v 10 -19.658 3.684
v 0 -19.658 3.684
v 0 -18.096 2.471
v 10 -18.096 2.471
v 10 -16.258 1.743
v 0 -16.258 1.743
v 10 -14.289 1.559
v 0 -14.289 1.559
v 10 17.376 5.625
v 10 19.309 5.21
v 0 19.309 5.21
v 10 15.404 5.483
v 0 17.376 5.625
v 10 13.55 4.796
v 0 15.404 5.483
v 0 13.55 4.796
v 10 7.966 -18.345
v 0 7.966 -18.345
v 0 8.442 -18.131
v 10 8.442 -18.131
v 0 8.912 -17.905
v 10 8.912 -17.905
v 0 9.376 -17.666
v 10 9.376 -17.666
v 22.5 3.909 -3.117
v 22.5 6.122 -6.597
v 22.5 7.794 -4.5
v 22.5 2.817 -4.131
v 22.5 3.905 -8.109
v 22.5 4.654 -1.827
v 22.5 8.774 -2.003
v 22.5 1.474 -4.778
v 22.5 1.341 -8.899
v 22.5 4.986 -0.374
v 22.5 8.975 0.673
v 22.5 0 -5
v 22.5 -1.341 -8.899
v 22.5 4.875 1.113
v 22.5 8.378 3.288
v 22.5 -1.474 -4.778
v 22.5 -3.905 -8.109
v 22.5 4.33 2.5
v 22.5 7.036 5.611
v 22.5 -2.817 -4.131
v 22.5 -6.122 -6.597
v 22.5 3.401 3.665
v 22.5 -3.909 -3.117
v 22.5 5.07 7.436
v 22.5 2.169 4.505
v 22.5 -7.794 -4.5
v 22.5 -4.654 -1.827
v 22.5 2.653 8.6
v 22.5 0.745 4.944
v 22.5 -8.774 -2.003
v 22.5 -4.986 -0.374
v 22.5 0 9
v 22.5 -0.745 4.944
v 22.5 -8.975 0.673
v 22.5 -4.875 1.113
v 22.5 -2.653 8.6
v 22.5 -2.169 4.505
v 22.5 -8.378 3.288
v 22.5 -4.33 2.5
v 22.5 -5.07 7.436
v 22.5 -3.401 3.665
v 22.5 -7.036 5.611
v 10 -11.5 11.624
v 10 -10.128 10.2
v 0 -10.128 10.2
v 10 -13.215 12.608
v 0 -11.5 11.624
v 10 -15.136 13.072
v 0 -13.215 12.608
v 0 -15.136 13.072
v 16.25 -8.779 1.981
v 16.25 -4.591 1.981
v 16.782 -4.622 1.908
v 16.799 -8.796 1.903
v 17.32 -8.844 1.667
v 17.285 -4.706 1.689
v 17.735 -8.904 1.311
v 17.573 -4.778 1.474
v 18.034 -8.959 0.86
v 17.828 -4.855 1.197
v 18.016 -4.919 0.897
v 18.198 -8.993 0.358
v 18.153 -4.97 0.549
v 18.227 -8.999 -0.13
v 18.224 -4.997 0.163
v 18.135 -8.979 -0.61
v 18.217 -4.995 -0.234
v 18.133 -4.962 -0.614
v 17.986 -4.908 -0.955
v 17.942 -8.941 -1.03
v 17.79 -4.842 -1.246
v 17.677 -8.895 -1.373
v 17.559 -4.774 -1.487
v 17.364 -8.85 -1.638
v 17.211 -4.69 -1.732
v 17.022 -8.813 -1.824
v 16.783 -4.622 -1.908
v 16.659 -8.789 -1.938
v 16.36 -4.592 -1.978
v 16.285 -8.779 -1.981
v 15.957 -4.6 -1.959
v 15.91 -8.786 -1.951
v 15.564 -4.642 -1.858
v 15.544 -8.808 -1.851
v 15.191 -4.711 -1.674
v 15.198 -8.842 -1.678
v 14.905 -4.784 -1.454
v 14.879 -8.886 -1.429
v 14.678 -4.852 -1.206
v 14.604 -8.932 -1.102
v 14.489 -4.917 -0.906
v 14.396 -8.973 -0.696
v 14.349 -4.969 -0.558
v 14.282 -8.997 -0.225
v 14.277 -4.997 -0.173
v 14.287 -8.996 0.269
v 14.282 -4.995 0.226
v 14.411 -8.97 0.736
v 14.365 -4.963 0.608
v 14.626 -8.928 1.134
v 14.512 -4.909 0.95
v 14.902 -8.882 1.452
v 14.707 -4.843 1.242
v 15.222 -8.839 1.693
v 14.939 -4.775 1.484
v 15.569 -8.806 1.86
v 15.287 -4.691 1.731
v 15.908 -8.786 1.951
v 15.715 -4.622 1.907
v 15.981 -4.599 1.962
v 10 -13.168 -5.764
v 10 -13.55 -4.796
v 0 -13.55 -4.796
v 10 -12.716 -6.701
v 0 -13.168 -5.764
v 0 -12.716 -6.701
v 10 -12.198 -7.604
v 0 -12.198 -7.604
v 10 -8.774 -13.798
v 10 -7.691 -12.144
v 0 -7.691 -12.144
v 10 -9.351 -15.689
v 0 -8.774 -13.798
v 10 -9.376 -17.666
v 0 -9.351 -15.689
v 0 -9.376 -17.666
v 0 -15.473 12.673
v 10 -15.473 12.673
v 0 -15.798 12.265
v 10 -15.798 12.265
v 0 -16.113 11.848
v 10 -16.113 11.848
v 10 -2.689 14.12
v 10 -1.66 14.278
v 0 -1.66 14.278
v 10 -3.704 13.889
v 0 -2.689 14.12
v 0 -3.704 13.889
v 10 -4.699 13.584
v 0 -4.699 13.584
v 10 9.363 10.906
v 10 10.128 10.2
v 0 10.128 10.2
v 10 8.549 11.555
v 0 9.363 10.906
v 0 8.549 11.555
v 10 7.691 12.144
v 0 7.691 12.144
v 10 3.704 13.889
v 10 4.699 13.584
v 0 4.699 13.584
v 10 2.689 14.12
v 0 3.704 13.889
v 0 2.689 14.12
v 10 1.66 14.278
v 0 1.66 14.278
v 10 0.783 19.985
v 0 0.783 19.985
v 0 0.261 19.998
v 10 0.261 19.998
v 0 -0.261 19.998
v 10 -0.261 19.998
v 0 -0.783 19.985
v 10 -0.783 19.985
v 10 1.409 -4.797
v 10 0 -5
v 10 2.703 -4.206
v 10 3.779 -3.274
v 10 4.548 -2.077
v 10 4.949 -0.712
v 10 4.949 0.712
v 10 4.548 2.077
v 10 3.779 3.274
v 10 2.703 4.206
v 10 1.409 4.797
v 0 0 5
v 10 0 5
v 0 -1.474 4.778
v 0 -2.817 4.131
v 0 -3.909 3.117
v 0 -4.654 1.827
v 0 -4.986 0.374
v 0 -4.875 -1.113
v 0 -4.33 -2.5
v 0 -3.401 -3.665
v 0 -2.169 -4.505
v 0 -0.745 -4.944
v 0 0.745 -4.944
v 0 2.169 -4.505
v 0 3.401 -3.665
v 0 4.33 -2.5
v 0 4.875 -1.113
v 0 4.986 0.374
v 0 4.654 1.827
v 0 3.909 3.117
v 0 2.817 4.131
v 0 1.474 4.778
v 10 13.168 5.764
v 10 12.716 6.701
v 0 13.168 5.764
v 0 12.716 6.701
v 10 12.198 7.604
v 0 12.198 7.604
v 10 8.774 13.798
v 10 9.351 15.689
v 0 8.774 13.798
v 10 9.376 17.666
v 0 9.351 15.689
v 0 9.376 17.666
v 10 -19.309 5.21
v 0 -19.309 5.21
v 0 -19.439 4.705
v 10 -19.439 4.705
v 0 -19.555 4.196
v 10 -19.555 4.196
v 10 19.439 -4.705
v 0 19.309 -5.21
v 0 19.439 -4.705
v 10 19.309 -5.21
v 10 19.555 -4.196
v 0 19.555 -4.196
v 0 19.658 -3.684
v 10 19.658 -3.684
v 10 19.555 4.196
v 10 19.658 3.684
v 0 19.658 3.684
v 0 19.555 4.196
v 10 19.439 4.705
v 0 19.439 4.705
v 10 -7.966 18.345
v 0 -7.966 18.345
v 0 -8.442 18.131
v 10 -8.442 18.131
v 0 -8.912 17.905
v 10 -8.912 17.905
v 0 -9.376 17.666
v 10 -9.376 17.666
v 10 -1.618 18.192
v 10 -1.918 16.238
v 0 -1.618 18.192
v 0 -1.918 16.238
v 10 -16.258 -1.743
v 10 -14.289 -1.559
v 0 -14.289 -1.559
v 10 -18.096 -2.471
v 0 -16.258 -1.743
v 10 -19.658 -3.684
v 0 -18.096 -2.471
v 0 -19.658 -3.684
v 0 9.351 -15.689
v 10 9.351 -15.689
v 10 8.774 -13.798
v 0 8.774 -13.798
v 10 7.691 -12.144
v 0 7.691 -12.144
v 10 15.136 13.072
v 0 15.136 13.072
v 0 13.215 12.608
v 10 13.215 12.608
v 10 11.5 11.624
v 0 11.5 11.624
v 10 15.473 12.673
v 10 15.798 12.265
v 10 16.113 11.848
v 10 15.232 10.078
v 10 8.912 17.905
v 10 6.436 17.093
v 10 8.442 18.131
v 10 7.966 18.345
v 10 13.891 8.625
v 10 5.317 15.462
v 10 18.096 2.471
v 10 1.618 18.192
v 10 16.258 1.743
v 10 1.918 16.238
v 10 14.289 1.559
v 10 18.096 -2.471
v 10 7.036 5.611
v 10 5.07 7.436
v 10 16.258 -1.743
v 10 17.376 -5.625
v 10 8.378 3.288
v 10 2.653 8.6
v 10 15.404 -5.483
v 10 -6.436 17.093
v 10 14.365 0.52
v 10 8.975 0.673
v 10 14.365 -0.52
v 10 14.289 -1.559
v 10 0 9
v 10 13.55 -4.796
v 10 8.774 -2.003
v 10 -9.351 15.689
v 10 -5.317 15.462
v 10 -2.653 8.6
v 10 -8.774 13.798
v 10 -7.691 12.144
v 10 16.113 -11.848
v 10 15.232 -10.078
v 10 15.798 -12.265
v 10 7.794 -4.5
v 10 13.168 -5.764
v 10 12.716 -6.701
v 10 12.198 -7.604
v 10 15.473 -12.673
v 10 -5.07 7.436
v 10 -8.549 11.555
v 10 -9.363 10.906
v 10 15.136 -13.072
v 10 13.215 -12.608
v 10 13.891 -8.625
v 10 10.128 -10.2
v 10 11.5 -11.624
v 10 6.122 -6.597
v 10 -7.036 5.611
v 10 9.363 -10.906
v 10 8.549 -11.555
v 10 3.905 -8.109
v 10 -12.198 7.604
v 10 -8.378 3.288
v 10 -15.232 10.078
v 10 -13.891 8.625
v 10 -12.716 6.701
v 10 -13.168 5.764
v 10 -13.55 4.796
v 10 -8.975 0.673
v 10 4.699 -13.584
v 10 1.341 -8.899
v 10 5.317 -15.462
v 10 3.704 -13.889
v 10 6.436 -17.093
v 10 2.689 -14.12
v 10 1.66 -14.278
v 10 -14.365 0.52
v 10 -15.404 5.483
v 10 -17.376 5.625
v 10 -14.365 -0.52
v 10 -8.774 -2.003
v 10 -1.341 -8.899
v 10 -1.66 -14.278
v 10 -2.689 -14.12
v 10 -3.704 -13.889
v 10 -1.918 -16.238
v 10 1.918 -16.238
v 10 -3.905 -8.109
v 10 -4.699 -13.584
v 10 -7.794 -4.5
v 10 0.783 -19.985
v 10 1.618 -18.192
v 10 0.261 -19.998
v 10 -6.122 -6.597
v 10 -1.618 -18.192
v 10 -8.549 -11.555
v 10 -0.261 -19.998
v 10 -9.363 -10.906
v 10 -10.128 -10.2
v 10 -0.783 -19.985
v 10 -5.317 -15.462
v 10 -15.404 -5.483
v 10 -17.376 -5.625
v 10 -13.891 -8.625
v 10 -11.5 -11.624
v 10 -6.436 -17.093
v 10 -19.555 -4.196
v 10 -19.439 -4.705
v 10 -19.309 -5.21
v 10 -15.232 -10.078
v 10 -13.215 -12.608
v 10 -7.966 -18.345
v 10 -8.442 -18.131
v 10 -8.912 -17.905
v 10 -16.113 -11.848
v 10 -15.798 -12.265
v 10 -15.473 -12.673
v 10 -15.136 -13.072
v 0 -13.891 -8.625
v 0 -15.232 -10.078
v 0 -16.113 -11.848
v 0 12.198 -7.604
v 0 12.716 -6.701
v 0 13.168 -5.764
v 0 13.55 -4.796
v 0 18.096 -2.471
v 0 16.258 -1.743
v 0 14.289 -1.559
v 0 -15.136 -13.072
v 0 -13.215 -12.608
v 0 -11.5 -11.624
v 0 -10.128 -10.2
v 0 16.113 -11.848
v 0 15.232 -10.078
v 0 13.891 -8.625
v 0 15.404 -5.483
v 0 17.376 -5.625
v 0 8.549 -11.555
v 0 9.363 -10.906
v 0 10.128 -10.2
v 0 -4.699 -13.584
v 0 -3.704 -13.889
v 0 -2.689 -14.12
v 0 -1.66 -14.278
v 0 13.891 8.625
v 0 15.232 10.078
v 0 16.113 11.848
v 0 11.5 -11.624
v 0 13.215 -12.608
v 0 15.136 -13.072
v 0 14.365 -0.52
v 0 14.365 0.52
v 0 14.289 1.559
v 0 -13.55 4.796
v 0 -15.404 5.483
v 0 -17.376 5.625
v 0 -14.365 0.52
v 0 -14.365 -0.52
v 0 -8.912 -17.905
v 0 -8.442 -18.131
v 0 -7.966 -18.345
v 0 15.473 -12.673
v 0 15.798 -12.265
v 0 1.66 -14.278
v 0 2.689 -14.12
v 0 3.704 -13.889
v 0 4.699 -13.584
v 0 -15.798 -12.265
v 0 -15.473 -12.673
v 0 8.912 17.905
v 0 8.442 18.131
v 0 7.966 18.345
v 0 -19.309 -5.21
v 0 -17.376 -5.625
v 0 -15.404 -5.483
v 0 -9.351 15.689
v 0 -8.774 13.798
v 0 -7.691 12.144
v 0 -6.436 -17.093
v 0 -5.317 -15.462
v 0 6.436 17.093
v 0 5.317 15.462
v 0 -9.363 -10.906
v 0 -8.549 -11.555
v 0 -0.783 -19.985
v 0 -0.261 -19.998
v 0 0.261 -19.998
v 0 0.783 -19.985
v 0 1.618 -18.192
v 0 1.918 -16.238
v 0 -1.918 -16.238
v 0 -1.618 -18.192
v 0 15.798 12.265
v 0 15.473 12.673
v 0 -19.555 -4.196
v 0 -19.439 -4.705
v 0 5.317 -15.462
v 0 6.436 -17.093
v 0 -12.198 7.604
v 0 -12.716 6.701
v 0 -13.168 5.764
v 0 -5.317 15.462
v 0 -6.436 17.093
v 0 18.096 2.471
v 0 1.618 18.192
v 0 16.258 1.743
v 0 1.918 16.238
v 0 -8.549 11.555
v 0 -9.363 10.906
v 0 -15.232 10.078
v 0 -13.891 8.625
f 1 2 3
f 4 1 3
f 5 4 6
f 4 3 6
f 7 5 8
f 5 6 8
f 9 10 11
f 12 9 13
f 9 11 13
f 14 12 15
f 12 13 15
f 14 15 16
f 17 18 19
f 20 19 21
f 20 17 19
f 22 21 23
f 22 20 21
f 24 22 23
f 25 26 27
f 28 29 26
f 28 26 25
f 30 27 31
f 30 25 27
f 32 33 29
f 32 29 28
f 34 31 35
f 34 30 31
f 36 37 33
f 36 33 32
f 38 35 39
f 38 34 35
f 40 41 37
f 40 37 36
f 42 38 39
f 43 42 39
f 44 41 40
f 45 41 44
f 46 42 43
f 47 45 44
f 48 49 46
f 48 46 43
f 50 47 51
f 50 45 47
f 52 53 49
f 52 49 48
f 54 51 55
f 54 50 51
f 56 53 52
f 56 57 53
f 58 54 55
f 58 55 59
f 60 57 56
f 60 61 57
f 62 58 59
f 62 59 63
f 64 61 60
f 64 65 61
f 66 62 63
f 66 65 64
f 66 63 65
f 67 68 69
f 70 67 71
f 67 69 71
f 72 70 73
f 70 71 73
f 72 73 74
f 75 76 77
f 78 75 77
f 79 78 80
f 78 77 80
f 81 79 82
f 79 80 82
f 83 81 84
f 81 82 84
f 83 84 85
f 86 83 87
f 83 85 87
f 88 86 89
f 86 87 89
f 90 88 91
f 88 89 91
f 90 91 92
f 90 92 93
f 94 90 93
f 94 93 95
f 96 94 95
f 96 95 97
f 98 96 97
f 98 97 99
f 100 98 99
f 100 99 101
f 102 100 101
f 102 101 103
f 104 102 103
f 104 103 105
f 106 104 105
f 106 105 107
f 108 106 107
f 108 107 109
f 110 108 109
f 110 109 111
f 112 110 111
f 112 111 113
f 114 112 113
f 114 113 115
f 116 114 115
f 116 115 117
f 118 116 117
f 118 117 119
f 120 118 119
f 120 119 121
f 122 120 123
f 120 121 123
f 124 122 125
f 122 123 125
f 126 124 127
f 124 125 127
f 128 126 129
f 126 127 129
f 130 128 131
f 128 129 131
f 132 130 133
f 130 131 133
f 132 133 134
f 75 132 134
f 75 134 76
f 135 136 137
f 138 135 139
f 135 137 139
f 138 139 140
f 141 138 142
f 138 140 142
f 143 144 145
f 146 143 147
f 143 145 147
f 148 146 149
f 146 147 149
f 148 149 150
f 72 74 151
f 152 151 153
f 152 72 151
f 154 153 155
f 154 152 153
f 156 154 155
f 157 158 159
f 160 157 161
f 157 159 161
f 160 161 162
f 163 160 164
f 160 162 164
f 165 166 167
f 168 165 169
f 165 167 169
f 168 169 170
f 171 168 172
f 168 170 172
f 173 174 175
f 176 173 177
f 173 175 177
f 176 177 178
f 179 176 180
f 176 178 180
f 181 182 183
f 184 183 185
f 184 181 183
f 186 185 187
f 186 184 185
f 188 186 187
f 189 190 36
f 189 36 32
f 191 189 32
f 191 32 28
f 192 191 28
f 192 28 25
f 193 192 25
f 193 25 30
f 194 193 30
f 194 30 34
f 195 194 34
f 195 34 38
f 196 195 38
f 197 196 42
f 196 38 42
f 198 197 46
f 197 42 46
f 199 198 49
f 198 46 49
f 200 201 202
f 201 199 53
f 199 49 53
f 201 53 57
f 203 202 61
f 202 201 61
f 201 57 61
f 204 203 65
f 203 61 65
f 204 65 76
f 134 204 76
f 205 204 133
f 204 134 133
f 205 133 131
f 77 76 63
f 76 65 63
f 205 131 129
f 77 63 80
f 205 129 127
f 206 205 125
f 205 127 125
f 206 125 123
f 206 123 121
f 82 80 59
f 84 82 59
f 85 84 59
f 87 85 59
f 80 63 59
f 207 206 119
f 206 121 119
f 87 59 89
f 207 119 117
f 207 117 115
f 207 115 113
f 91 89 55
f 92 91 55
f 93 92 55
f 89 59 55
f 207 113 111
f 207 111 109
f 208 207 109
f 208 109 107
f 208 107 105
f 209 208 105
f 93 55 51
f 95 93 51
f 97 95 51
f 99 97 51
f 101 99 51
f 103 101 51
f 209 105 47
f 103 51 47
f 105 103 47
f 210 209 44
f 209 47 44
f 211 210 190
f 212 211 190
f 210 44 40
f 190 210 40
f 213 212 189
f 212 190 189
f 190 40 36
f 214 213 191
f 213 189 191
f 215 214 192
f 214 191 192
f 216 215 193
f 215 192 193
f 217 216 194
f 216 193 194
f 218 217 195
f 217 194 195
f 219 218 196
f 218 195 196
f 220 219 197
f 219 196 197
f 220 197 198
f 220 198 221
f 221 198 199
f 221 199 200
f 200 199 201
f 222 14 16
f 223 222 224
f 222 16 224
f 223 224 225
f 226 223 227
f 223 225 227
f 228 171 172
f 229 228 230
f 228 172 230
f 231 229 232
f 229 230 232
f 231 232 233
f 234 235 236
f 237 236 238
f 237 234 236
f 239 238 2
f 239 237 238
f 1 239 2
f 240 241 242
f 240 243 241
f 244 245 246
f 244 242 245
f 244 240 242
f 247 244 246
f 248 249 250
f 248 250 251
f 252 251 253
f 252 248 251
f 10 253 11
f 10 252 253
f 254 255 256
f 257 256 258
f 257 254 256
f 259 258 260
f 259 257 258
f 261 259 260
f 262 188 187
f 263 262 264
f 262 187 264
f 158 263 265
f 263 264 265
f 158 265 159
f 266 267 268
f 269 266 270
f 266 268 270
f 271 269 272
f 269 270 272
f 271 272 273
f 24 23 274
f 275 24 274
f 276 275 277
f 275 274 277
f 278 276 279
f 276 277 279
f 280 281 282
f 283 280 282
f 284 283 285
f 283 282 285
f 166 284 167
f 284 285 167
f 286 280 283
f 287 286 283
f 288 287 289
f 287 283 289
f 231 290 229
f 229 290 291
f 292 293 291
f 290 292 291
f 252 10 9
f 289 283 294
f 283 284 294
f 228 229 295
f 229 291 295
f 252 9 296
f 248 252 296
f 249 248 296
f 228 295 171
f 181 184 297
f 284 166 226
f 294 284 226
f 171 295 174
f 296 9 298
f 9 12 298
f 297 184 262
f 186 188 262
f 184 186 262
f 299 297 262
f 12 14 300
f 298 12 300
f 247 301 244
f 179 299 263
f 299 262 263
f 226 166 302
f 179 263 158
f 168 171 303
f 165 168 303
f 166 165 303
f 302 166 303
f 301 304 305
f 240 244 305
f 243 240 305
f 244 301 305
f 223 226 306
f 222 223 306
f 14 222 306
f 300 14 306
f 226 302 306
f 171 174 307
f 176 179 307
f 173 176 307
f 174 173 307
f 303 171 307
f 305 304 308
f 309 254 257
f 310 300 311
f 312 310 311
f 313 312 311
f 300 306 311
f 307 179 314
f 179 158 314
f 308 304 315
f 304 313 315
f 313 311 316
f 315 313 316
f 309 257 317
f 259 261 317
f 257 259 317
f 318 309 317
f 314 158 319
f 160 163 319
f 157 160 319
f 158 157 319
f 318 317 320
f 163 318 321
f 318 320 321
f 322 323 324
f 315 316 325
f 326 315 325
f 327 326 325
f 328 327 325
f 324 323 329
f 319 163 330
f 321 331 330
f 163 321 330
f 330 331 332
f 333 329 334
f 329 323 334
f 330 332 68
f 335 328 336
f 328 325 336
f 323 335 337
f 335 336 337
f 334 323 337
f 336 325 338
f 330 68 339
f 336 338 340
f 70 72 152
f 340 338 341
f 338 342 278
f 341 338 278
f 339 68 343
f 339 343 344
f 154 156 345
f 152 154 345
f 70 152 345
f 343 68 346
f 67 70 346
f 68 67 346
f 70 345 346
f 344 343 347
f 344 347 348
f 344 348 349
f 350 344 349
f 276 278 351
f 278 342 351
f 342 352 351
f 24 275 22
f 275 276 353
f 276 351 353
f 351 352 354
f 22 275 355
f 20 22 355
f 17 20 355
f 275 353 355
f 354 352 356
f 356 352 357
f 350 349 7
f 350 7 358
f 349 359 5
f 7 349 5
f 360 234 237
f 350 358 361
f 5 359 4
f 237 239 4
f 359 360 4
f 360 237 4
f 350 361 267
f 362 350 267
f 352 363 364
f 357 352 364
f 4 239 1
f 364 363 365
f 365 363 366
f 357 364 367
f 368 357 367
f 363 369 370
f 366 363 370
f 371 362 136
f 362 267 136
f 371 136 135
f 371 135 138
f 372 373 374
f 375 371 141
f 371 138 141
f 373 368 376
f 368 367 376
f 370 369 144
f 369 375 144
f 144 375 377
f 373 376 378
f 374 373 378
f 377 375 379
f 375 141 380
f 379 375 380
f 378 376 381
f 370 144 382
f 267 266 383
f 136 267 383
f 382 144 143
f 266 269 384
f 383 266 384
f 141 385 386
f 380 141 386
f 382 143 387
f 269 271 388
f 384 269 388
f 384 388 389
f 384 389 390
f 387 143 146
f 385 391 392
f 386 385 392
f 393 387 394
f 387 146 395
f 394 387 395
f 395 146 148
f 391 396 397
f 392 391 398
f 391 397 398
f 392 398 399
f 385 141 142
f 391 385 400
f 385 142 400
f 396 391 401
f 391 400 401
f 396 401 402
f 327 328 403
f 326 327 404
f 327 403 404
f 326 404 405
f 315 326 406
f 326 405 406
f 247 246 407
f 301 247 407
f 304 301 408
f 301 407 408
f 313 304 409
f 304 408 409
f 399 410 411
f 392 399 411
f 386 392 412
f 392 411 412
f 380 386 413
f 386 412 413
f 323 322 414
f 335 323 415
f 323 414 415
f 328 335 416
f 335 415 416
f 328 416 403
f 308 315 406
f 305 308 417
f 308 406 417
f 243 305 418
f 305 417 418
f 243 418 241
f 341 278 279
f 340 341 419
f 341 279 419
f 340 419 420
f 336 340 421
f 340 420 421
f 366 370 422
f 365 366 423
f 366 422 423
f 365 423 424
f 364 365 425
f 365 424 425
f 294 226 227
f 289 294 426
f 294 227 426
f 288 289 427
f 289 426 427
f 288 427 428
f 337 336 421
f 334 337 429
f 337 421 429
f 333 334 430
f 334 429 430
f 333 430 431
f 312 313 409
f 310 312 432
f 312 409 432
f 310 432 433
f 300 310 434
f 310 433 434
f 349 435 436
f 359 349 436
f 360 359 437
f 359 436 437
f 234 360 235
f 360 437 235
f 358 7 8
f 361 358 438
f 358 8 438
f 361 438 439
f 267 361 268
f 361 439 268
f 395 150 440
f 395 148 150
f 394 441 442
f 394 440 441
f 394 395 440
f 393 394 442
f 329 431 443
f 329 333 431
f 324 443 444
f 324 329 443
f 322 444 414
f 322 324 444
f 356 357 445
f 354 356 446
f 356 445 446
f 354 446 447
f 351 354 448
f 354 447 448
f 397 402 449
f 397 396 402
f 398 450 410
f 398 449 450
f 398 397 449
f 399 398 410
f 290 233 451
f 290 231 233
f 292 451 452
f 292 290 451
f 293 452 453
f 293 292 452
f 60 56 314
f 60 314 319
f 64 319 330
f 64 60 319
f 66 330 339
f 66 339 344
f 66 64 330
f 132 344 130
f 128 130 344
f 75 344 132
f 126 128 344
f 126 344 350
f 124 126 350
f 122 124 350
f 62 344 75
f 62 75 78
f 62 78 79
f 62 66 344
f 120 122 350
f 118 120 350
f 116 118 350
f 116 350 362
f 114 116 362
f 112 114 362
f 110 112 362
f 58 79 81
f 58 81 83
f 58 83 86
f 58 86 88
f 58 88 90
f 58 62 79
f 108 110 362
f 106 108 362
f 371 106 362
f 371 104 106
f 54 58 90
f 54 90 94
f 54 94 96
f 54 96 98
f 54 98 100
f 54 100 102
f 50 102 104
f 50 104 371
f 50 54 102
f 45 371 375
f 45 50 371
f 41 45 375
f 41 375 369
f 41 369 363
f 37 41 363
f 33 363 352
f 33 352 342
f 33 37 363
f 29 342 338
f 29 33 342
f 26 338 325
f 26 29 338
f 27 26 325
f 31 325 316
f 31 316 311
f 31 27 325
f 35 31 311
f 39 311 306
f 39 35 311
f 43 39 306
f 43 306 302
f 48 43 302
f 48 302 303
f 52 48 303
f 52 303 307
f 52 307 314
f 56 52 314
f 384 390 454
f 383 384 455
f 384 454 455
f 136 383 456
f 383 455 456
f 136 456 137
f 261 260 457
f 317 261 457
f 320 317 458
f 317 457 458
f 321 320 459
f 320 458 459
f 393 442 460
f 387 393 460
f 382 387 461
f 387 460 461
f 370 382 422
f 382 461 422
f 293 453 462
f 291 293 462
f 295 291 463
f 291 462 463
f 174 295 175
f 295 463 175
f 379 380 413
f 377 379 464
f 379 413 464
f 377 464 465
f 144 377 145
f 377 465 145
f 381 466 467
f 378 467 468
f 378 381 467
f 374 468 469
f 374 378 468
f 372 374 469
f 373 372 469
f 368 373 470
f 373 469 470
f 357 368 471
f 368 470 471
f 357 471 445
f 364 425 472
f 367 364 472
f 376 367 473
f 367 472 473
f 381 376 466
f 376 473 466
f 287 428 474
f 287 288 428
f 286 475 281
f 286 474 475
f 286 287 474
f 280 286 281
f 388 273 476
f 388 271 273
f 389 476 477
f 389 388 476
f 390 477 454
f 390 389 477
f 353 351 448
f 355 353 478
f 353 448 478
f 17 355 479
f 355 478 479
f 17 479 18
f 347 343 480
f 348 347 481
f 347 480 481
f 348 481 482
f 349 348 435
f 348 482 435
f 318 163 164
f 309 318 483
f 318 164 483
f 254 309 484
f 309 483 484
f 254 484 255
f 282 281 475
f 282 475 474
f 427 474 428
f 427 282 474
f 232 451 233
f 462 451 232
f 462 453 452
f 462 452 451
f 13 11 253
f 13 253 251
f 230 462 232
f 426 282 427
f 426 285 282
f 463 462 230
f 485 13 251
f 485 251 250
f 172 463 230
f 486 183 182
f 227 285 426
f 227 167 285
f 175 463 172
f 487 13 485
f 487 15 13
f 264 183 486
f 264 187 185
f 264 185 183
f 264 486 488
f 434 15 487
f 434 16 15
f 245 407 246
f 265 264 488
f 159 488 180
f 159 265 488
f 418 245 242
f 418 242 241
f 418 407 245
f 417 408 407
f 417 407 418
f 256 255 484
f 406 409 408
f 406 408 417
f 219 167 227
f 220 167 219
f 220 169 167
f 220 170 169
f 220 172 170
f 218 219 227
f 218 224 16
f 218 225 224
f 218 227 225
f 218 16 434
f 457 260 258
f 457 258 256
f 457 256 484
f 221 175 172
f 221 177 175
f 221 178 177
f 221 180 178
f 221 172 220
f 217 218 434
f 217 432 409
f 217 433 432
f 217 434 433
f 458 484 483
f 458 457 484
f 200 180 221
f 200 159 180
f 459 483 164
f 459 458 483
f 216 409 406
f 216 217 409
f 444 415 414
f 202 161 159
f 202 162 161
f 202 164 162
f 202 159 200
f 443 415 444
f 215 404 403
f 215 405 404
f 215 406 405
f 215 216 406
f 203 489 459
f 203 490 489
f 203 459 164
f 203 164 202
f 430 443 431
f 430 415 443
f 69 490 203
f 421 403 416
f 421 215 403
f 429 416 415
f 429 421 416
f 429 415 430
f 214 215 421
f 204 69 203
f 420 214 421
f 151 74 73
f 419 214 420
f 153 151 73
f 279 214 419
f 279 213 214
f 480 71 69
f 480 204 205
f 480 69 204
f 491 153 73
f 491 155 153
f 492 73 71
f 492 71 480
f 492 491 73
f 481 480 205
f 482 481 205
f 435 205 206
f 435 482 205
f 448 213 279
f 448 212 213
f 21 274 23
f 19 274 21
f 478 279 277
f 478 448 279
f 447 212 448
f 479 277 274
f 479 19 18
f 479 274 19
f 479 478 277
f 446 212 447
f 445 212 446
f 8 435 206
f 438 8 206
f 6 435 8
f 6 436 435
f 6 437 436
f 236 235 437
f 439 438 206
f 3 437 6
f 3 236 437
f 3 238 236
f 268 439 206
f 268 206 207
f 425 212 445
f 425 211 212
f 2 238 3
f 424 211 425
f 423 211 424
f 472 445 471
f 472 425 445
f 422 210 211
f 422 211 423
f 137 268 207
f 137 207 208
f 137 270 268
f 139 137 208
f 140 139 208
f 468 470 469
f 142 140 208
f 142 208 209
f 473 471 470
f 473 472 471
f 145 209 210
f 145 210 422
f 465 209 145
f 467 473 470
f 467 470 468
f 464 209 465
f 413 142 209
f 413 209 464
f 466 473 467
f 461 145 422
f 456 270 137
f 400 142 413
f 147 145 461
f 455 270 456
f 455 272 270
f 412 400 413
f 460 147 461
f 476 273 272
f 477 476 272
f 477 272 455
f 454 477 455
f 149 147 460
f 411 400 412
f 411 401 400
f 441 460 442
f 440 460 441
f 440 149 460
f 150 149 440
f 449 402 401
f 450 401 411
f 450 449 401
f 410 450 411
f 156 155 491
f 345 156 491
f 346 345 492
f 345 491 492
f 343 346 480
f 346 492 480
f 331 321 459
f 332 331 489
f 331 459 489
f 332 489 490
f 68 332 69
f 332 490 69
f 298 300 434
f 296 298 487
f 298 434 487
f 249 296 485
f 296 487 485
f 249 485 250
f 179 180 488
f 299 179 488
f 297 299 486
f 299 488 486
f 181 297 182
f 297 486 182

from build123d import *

# Parameters (mm, degrees)
BASPROSKE_W             = 10
BASPROSKE_H             = 20
TOOTHCUT_DEPTH          = 31
TEETHCUTS_COUNT         = 14
TEETHCUTS_ANGLE         = 334.285714286
BORSKE_R                = 5
BORE_DEPTH              = 50.0000508
BOSS_EXTRU_1_START      = 12.5
ESQUISSE1_R             = 9
ESQUISSE1_R_2           = 5
BOSS_EXTRU_1_DEPTH      = 12.5
ESQUISSE2_R             = 1.980815445
ENL_V_MAT_EXTRU_1_DEPTH = 12.5


with BuildPart() as part:
    # BasProSke → Base-Revolve (revolve)
    with BuildSketch(Plane(origin=(0, 0, 0), x_dir=(1, 0, 0), z_dir=(0, 1, 0)), mode=Mode.PRIVATE) as base_revolve_sk:
        with Locations((5, 10)):
            Rectangle(BASPROSKE_W, BASPROSKE_H)
    revolve(base_revolve_sk.sketch.rotate(Axis((-10, 0, 0), (1, 0, 0)), 180), axis=Axis((-10, 0, 0), (1, 0, 0)))

    # TooCutSke → ToothCut (cut, through all)
    with BuildSketch(Plane(origin=(0, 0, 0), x_dir=(0, 0, -1), z_dir=(1, 0, 0))):
        with BuildLine():
            ThreePointArc((1.558726024, 14.28923543), (0, 14.374), (-1.558726024, 14.28923543))
            ThreePointArc((-1.558726024, 14.28923543), (-2.047638508, 17.217318907), (-3.706114514, 19.679465449))
            ThreePointArc((-3.706114514, 19.679465449), (0, 20.0254), (3.706114514, 19.679465449))
            ThreePointArc((3.706114514, 19.679465449), (2.047638508, 17.217318907), (1.558726024, 14.28923543))
        make_face()
    toothcut = extrude(amount=TOOTHCUT_DEPTH, mode=Mode.SUBTRACT)

    # TeethCuts: ToothCut ×14 about axis
    teethcuts_axis = Axis((-10, 0, 0), (1, 0, 0))
    for i in range(1, TEETHCUTS_COUNT):
        add(toothcut.rotate(teethcuts_axis, i * TEETHCUTS_ANGLE / (TEETHCUTS_COUNT - 1)), mode=Mode.SUBTRACT)

    # BorSke → Bore (cut, symmetric)
    with BuildSketch(Plane(origin=(0, 0, 0), x_dir=(0, 0, -1), z_dir=(1, 0, 0))):
        with Locations(Location((0, 0, 0), (0, 0, 180))):
            Circle(BORSKE_R)
    extrude(amount=BORE_DEPTH, both=True, mode=Mode.SUBTRACT)

    # Esquisse1 → Boss.-Extru.1 (add)
    with BuildSketch(Plane(origin=(10, 0, 0), x_dir=(0, 0, -1), z_dir=(1, 0, 0)).offset(BOSS_EXTRU_1_START)):
        with Locations(Location((0, 0, 0), (0, 0, 180))):
            Circle(ESQUISSE1_R)
        Circle(ESQUISSE1_R_2, mode=Mode.SUBTRACT)
    extrude(amount=-BOSS_EXTRU_1_DEPTH)

    # Esquisse2 → Enlèv. mat.-Extru.1 (cut)
    with BuildSketch(Plane(origin=(0, 0, 0), x_dir=(1, 0, 0), z_dir=(0, 1, 0))):
        with Locations(Location((16.25, 0, 0), (0, 0, 270))):
            Circle(ESQUISSE2_R)
    extrude(amount=-ENL_V_MAT_EXTRU_1_DEPTH, mode=Mode.SUBTRACT)


solid = part.part
